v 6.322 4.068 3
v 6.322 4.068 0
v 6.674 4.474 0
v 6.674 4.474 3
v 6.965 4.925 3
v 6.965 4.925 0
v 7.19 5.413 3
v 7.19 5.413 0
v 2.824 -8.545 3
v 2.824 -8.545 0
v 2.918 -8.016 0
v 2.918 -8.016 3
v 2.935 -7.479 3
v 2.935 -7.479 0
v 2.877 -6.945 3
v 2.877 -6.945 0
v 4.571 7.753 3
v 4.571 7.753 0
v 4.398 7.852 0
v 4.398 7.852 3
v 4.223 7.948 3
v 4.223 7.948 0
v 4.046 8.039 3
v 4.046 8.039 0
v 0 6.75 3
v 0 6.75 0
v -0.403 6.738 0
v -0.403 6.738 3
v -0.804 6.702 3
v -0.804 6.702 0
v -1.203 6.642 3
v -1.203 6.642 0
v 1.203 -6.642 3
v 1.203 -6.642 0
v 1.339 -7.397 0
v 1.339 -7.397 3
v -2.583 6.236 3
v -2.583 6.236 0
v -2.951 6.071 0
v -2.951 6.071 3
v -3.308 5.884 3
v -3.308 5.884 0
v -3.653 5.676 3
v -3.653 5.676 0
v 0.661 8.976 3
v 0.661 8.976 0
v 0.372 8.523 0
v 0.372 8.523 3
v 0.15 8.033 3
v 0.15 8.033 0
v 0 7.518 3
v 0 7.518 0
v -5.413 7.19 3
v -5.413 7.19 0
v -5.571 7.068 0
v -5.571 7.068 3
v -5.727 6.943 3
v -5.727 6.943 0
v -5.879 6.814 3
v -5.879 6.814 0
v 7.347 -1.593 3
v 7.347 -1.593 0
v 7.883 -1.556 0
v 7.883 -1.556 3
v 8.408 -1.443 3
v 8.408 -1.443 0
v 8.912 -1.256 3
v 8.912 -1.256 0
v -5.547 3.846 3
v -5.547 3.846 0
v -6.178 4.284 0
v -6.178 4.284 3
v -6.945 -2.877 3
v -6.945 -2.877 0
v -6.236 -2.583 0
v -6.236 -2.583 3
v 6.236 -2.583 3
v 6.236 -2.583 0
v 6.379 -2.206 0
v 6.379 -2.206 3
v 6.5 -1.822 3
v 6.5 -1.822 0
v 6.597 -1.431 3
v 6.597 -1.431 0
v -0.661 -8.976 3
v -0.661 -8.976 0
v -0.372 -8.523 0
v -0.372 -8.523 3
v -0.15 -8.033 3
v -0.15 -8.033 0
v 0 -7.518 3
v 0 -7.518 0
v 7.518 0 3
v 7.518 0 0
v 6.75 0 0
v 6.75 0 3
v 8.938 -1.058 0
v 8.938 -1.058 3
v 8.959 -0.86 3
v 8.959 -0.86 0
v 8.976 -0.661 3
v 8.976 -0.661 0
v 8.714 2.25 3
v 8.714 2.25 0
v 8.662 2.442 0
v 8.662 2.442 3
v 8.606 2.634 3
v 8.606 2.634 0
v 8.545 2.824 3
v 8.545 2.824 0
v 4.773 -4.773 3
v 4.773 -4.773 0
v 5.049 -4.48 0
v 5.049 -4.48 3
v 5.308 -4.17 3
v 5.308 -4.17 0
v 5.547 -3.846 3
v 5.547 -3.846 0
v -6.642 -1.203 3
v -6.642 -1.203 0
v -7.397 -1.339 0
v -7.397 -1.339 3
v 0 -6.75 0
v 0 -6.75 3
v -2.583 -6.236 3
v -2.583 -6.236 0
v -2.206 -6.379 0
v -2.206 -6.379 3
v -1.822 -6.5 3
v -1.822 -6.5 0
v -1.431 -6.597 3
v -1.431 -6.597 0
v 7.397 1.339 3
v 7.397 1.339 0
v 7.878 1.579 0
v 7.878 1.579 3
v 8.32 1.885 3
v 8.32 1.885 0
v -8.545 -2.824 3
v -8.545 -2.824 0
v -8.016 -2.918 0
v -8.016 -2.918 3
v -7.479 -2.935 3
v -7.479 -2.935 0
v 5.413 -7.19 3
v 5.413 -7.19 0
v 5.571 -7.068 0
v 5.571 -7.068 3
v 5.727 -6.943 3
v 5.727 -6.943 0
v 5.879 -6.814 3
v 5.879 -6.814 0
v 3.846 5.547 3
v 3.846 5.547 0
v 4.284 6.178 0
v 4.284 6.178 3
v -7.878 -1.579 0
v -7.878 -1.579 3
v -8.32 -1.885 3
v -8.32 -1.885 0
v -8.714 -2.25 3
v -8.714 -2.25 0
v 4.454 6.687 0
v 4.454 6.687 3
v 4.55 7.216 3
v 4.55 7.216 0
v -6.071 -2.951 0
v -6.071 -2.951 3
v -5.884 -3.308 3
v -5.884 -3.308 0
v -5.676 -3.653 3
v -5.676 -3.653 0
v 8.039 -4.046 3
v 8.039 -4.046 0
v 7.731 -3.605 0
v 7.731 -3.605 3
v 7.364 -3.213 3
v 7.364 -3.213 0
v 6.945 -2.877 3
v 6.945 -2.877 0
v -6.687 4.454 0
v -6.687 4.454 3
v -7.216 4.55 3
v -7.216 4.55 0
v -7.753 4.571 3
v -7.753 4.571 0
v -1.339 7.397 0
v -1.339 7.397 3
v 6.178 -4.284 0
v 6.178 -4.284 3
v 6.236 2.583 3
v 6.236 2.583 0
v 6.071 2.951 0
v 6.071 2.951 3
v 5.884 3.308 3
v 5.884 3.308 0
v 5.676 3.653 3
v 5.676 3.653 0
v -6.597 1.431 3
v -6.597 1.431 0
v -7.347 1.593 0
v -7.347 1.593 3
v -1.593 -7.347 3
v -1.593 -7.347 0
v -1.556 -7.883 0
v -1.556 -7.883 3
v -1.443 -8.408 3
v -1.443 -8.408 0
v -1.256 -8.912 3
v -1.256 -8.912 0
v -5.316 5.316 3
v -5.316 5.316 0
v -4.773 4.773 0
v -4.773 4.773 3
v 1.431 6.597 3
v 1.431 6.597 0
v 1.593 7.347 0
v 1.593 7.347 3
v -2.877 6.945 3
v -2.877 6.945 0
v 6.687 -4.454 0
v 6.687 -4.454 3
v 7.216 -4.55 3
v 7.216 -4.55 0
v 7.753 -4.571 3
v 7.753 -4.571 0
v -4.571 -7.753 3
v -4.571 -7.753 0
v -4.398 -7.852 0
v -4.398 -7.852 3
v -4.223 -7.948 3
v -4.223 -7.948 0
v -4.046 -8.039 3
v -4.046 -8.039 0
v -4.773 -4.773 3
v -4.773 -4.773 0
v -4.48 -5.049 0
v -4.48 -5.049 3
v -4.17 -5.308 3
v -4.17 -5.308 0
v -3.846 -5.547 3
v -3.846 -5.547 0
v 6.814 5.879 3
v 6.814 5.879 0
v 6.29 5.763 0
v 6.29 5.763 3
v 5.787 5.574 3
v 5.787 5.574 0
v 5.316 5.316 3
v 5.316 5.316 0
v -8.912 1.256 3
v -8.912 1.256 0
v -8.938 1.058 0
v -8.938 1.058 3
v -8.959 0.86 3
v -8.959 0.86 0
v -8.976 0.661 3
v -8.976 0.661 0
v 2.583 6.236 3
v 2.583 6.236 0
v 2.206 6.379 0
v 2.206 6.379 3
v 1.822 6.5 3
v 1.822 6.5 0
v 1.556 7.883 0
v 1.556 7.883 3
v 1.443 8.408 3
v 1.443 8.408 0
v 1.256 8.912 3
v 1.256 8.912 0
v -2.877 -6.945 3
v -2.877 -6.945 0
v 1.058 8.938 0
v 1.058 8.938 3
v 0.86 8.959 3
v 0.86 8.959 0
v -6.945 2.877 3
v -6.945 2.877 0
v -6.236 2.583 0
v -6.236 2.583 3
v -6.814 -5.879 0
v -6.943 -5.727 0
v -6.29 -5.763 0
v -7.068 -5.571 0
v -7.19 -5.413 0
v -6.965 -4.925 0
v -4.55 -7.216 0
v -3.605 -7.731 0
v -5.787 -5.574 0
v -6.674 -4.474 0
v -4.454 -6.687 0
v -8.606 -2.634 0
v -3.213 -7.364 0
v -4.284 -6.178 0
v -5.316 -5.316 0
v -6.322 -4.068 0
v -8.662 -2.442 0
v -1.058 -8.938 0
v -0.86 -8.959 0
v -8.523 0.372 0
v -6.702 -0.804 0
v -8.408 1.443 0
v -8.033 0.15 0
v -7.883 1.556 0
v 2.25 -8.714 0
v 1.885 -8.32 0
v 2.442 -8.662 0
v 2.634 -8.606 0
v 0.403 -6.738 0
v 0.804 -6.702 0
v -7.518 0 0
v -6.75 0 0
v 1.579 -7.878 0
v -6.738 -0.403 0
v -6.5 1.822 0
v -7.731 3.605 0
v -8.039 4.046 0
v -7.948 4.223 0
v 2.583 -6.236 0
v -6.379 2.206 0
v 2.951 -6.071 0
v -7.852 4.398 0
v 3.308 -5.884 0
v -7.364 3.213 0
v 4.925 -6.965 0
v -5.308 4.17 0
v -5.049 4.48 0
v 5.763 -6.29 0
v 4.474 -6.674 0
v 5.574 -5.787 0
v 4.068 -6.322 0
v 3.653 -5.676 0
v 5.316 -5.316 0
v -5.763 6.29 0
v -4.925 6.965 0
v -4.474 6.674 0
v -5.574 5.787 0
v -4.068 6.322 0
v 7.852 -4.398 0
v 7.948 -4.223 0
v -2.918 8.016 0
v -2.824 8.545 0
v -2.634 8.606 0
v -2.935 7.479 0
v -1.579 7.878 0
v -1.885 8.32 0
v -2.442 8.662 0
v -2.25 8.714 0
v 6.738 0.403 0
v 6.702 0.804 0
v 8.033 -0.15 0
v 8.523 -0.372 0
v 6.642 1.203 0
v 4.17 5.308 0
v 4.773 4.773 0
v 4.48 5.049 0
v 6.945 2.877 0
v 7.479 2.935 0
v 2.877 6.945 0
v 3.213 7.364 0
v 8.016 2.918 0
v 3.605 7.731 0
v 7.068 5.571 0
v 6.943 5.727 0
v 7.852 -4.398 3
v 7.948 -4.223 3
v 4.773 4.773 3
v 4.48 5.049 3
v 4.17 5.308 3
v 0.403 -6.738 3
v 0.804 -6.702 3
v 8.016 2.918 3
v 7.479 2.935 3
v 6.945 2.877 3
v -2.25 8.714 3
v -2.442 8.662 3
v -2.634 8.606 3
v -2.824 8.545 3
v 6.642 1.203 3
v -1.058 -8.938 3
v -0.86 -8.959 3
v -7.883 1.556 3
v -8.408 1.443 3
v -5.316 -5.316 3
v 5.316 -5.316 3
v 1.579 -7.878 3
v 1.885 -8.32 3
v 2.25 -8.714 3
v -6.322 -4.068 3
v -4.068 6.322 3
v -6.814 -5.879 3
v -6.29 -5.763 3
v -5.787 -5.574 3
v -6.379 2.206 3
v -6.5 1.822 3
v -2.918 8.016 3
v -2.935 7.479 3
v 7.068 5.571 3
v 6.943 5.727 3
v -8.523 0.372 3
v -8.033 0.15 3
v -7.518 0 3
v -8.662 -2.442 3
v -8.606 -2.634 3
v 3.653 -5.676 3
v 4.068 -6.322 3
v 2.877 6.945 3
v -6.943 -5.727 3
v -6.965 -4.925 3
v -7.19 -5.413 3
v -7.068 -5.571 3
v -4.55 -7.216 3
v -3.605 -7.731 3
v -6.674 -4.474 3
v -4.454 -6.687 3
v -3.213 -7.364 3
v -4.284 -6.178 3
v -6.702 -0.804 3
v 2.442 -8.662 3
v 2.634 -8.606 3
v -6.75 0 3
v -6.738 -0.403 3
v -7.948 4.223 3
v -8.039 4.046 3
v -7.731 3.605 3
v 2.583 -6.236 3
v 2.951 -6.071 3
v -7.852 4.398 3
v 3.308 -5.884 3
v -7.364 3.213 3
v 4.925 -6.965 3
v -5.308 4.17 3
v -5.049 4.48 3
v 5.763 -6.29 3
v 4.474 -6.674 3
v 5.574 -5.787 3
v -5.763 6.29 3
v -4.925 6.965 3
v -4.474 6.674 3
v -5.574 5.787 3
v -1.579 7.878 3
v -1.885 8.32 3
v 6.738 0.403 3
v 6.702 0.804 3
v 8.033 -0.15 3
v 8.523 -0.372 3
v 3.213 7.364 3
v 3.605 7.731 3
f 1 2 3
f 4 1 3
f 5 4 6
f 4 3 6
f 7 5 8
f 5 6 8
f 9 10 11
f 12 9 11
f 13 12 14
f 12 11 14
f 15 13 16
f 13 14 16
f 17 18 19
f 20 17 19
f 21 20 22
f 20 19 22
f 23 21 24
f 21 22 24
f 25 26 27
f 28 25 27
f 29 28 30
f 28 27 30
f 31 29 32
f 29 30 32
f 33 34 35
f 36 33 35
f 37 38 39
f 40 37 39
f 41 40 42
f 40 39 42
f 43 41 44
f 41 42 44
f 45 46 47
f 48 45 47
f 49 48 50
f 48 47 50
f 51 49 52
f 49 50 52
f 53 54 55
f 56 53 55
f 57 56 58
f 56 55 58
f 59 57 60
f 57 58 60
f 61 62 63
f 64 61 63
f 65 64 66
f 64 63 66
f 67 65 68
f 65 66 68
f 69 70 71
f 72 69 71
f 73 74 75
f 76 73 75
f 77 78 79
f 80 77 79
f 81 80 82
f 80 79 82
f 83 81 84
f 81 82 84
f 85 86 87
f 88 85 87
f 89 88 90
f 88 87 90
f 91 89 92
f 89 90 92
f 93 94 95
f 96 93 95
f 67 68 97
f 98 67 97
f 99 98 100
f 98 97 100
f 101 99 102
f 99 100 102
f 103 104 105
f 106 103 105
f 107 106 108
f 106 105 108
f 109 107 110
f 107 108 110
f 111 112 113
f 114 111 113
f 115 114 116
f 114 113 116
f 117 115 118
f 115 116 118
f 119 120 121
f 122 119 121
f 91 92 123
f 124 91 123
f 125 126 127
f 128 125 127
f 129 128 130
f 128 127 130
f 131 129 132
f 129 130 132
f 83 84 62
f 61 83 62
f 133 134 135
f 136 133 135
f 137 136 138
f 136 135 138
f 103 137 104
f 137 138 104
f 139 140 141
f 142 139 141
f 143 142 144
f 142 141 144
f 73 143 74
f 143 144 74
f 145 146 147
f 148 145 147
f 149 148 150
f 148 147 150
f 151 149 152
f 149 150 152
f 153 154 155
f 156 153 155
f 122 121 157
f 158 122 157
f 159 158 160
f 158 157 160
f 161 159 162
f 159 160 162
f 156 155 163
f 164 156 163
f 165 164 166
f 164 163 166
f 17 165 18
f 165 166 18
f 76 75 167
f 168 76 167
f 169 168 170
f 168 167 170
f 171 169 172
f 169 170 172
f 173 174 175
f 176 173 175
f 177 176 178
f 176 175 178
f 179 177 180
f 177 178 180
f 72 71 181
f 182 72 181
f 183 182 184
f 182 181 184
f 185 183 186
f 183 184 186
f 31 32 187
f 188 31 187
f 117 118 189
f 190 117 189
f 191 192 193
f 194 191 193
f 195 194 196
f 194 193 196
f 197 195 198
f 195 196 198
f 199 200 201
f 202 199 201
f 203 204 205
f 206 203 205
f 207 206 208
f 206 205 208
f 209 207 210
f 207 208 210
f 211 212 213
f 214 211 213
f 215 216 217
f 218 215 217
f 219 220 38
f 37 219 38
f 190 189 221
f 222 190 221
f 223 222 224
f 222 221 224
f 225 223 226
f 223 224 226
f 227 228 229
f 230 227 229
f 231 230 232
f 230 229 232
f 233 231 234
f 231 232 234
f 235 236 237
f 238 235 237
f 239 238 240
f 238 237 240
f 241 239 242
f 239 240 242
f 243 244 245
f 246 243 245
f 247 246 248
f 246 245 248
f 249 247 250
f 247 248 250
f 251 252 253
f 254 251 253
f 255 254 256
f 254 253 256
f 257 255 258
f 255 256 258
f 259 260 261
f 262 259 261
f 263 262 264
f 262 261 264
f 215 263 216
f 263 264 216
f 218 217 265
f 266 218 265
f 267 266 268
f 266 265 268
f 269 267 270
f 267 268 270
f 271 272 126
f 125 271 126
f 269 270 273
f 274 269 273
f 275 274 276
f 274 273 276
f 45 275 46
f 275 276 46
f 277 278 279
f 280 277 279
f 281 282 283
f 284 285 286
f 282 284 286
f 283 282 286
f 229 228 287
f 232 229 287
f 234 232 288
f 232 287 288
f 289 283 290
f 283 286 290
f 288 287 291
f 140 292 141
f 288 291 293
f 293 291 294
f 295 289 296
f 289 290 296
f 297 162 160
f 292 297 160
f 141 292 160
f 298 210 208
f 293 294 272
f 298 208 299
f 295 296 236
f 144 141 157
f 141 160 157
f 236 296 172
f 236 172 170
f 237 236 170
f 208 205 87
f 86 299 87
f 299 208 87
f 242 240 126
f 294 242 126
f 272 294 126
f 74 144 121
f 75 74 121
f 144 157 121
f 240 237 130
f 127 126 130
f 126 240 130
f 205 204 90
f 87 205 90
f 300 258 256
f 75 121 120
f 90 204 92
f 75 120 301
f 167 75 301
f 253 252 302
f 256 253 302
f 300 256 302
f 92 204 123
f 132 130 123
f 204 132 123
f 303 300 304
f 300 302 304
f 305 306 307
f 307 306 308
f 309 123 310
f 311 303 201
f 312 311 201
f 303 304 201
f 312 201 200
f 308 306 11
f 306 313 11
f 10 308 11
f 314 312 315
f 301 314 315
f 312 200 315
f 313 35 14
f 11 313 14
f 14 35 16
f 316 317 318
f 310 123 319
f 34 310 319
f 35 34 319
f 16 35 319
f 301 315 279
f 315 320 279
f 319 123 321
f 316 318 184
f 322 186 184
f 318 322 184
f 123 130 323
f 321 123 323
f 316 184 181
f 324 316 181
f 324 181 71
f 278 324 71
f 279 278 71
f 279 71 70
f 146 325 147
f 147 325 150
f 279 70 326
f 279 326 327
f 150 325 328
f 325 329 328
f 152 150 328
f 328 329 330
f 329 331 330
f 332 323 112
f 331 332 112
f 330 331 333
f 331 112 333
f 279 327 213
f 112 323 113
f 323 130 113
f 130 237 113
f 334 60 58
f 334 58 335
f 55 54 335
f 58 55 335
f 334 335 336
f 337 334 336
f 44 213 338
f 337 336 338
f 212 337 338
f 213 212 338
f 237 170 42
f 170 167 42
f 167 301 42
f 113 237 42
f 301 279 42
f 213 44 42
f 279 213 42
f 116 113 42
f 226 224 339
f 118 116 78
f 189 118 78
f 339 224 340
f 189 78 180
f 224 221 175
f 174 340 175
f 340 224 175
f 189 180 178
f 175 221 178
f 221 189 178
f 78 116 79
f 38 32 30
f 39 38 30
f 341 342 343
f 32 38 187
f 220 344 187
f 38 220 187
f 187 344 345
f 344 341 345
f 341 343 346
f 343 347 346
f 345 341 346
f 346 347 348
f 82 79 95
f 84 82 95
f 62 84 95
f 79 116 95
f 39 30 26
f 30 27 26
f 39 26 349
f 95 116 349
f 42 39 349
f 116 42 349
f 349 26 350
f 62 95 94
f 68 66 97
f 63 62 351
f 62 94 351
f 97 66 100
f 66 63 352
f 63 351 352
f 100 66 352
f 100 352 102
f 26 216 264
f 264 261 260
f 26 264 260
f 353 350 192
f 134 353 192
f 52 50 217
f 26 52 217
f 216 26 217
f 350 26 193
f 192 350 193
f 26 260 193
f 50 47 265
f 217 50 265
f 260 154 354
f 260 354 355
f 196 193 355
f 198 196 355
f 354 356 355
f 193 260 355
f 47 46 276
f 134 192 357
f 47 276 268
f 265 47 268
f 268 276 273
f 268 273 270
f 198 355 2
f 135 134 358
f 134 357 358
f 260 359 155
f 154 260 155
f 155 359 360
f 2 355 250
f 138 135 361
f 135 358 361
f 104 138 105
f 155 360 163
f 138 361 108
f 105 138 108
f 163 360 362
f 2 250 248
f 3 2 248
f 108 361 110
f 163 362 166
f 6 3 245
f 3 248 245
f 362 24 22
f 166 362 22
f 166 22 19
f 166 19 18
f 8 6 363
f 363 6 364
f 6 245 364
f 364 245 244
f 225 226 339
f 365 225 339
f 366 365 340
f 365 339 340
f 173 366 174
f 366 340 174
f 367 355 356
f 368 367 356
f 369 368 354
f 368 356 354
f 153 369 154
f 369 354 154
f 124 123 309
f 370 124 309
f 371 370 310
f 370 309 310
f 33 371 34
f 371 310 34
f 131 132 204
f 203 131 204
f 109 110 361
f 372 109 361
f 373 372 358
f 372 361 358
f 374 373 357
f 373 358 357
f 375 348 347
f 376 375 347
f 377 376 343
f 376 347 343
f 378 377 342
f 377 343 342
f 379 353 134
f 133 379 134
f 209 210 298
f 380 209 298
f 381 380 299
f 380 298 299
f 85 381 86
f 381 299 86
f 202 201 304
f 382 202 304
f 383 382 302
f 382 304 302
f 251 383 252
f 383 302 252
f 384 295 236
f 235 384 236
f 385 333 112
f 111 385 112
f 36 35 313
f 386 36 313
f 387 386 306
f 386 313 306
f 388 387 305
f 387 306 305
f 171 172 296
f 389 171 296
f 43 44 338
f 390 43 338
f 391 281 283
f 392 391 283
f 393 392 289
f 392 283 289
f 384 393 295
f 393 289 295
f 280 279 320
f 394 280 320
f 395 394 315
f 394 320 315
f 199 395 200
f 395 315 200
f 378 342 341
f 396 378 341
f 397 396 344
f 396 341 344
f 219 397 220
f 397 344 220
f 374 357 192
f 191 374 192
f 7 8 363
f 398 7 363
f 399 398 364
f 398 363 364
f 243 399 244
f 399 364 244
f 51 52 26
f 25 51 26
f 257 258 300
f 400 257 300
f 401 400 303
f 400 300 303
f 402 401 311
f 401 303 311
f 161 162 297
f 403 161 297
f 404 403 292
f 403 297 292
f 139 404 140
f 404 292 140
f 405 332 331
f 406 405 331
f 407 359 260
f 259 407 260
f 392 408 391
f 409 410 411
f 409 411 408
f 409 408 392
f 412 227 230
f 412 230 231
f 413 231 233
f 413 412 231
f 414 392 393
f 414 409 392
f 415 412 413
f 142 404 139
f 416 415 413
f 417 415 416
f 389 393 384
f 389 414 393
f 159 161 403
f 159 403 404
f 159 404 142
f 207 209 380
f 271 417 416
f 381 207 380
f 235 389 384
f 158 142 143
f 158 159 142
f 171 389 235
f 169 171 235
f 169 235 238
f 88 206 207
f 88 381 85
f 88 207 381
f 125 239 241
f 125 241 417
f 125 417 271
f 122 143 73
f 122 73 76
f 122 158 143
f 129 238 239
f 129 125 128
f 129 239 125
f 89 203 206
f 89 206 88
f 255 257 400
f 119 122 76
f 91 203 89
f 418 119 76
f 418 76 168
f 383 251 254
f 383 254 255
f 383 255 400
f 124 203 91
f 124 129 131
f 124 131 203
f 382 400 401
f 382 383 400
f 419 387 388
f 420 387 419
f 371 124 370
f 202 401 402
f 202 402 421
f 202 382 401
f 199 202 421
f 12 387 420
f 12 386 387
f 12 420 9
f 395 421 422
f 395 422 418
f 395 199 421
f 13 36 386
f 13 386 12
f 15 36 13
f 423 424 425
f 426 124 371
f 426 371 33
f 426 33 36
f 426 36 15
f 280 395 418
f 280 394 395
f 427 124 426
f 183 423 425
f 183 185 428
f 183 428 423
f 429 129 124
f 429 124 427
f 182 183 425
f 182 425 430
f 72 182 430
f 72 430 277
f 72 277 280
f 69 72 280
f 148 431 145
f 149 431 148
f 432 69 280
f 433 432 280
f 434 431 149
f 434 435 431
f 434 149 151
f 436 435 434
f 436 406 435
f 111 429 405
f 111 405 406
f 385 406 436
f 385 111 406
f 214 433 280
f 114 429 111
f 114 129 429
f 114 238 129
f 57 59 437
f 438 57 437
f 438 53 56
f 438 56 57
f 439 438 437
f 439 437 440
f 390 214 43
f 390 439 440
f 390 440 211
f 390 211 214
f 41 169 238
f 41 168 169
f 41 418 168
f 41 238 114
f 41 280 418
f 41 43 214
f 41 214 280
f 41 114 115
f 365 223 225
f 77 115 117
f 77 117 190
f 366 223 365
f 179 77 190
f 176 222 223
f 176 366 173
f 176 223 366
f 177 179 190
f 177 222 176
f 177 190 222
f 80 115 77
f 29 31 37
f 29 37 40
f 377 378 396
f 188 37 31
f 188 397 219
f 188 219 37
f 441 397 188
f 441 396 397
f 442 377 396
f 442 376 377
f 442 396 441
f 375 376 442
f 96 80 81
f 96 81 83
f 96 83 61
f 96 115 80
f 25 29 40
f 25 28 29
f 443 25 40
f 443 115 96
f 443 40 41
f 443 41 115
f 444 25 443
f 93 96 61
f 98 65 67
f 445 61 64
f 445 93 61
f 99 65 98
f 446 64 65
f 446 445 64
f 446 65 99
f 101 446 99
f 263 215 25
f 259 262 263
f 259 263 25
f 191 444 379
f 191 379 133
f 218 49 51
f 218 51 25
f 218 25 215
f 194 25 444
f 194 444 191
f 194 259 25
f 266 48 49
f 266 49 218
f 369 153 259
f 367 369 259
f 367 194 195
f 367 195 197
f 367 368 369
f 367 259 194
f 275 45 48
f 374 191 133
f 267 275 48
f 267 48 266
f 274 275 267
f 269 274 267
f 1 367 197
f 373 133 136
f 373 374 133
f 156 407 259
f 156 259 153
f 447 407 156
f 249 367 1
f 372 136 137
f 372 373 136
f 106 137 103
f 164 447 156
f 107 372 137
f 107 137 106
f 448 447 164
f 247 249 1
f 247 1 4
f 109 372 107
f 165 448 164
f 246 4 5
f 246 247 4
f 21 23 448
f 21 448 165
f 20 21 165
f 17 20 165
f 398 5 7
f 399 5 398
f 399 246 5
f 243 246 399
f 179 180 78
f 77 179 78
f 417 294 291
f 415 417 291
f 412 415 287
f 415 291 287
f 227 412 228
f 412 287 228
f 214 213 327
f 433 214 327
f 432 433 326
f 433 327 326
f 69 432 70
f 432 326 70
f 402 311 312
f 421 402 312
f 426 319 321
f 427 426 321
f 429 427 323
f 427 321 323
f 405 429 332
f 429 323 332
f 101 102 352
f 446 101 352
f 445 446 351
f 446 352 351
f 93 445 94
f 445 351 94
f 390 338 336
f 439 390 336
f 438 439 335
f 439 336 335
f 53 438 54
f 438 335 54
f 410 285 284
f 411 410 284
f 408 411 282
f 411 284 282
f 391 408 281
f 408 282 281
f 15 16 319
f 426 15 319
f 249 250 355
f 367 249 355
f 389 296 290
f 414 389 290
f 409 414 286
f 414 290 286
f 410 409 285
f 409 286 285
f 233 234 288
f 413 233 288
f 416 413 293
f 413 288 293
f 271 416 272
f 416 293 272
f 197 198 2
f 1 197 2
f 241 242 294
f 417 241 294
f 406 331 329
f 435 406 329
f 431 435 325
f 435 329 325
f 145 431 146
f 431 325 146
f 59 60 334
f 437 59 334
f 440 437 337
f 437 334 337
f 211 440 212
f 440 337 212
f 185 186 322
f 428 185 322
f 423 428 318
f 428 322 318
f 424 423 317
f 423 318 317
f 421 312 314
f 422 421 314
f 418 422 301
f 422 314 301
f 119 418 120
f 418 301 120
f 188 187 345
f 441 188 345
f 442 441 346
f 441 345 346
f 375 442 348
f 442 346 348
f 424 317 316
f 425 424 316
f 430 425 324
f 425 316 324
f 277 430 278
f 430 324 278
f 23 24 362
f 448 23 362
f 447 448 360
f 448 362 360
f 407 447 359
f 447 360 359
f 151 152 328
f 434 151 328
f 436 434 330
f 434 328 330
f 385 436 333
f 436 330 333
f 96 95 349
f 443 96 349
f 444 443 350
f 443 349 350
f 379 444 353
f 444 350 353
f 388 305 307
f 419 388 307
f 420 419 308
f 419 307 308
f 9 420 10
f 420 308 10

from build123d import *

# Parameters (mm, degrees)
BOSS_EXTRU_1_DEPTH           = 3
R_P_TITION_CIRCULAIRE2_COUNT = 16
ESQUISSE5_R                  = 6.75
BOSS_EXTRU_2_DEPTH           = 3


with BuildPart() as part:
    # Esquisse4 → Boss.-Extru.1 (new body)
    with BuildSketch(Plane.XY):
        with BuildLine():
            Line((0, 7.517540966), (0, 6.75))
            ThreePointArc((0, 6.75), (0.719454333, 6.711548664), (1.430711931, 6.59663273))
            Line((1.430711931, 6.59663273), (1.593397859, 7.346734339))
            ThreePointArc((1.593397859, 7.346734339), (1.508511555, 8.147299885), (1.256427196, 8.911867969))
            ThreePointArc((1.256427196, 8.911867969), (0.959272444, 8.948731551), (0.661055861, 8.975689675))
            ThreePointArc((0.661055861, 8.975689675), (0.252643326, 8.281924527), (0, 7.517540966))
        make_face()
    extrude(amount=BOSS_EXTRU_1_DEPTH)


with BuildPart() as r_p_tition_circulaire2_1:
    # Répétition circulaire2: pattern copy
    add(part.part.rotate(Axis((0, 0, 0), (0, 0, 1)), 1 * 360 / R_P_TITION_CIRCULAIRE2_COUNT))


with BuildPart() as r_p_tition_circulaire2_2:
    # Répétition circulaire2: pattern copy
    add(part.part.rotate(Axis((0, 0, 0), (0, 0, 1)), 2 * 360 / R_P_TITION_CIRCULAIRE2_COUNT))


with BuildPart() as r_p_tition_circulaire2_3:
    # Répétition circulaire2: pattern copy
    add(part.part.rotate(Axis((0, 0, 0), (0, 0, 1)), 3 * 360 / R_P_TITION_CIRCULAIRE2_COUNT))


with BuildPart() as r_p_tition_circulaire2_4:
    # Répétition circulaire2: pattern copy
    add(part.part.rotate(Axis((0, 0, 0), (0, 0, 1)), 4 * 360 / R_P_TITION_CIRCULAIRE2_COUNT))


with BuildPart() as r_p_tition_circulaire2_5:
    # Répétition circulaire2: pattern copy
    add(part.part.rotate(Axis((0, 0, 0), (0, 0, 1)), 5 * 360 / R_P_TITION_CIRCULAIRE2_COUNT))


with BuildPart() as r_p_tition_circulaire2_6:
    # Répétition circulaire2: pattern copy
    add(part.part.rotate(Axis((0, 0, 0), (0, 0, 1)), 6 * 360 / R_P_TITION_CIRCULAIRE2_COUNT))


with BuildPart() as r_p_tition_circulaire2_7:
    # Répétition circulaire2: pattern copy
    add(part.part.rotate(Axis((0, 0, 0), (0, 0, 1)), 7 * 360 / R_P_TITION_CIRCULAIRE2_COUNT))


with BuildPart() as r_p_tition_circulaire2_8:
    # Répétition circulaire2: pattern copy
    add(part.part.rotate(Axis((0, 0, 0), (0, 0, 1)), 8 * 360 / R_P_TITION_CIRCULAIRE2_COUNT))


with BuildPart() as r_p_tition_circulaire2_9:
    # Répétition circulaire2: pattern copy
    add(part.part.rotate(Axis((0, 0, 0), (0, 0, 1)), 9 * 360 / R_P_TITION_CIRCULAIRE2_COUNT))


with BuildPart() as r_p_tition_circulaire2_10:
    # Répétition circulaire2: pattern copy
    add(part.part.rotate(Axis((0, 0, 0), (0, 0, 1)), 10 * 360 / R_P_TITION_CIRCULAIRE2_COUNT))


with BuildPart() as r_p_tition_circulaire2_11:
    # Répétition circulaire2: pattern copy
    add(part.part.rotate(Axis((0, 0, 0), (0, 0, 1)), 11 * 360 / R_P_TITION_CIRCULAIRE2_COUNT))


with BuildPart() as r_p_tition_circulaire2_12:
    # Répétition circulaire2: pattern copy
    add(part.part.rotate(Axis((0, 0, 0), (0, 0, 1)), 12 * 360 / R_P_TITION_CIRCULAIRE2_COUNT))


with BuildPart() as r_p_tition_circulaire2_13:
    # Répétition circulaire2: pattern copy
    add(part.part.rotate(Axis((0, 0, 0), (0, 0, 1)), 13 * 360 / R_P_TITION_CIRCULAIRE2_COUNT))


with BuildPart() as r_p_tition_circulaire2_14:
    # Répétition circulaire2: pattern copy
    add(part.part.rotate(Axis((0, 0, 0), (0, 0, 1)), 14 * 360 / R_P_TITION_CIRCULAIRE2_COUNT))


with BuildPart() as r_p_tition_circulaire2_15:
    # Répétition circulaire2: pattern copy
    add(part.part.rotate(Axis((0, 0, 0), (0, 0, 1)), 15 * 360 / R_P_TITION_CIRCULAIRE2_COUNT))


with BuildPart() as part_1:
    add(part.part)

    add(r_p_tition_circulaire2_1.part)  # Boss.-Extru.2 merges Répétition circulaire2_1

    add(r_p_tition_circulaire2_2.part)  # Boss.-Extru.2 merges Répétition circulaire2_2

    add(r_p_tition_circulaire2_3.part)  # Boss.-Extru.2 merges Répétition circulaire2_3

    add(r_p_tition_circulaire2_4.part)  # Boss.-Extru.2 merges Répétition circulaire2_4

    add(r_p_tition_circulaire2_5.part)  # Boss.-Extru.2 merges Répétition circulaire2_5

    add(r_p_tition_circulaire2_6.part)  # Boss.-Extru.2 merges Répétition circulaire2_6

    add(r_p_tition_circulaire2_7.part)  # Boss.-Extru.2 merges Répétition circulaire2_7

    add(r_p_tition_circulaire2_8.part)  # Boss.-Extru.2 merges Répétition circulaire2_8

    add(r_p_tition_circulaire2_9.part)  # Boss.-Extru.2 merges Répétition circulaire2_9

    add(r_p_tition_circulaire2_10.part)  # Boss.-Extru.2 merges Répétition circulaire2_10

    add(r_p_tition_circulaire2_11.part)  # Boss.-Extru.2 merges Répétition circulaire2_11

    add(r_p_tition_circulaire2_12.part)  # Boss.-Extru.2 merges Répétition circulaire2_12

    add(r_p_tition_circulaire2_13.part)  # Boss.-Extru.2 merges Répétition circulaire2_13

    add(r_p_tition_circulaire2_14.part)  # Boss.-Extru.2 merges Répétition circulaire2_14

    add(r_p_tition_circulaire2_15.part)  # Boss.-Extru.2 merges Répétition circulaire2_15
    # Esquisse5 → Boss.-Extru.2 (add)
    with BuildSketch(Plane.XY):
        Circle(ESQUISSE5_R)
    extrude(amount=BOSS_EXTRU_2_DEPTH)


solid = part_1.part
